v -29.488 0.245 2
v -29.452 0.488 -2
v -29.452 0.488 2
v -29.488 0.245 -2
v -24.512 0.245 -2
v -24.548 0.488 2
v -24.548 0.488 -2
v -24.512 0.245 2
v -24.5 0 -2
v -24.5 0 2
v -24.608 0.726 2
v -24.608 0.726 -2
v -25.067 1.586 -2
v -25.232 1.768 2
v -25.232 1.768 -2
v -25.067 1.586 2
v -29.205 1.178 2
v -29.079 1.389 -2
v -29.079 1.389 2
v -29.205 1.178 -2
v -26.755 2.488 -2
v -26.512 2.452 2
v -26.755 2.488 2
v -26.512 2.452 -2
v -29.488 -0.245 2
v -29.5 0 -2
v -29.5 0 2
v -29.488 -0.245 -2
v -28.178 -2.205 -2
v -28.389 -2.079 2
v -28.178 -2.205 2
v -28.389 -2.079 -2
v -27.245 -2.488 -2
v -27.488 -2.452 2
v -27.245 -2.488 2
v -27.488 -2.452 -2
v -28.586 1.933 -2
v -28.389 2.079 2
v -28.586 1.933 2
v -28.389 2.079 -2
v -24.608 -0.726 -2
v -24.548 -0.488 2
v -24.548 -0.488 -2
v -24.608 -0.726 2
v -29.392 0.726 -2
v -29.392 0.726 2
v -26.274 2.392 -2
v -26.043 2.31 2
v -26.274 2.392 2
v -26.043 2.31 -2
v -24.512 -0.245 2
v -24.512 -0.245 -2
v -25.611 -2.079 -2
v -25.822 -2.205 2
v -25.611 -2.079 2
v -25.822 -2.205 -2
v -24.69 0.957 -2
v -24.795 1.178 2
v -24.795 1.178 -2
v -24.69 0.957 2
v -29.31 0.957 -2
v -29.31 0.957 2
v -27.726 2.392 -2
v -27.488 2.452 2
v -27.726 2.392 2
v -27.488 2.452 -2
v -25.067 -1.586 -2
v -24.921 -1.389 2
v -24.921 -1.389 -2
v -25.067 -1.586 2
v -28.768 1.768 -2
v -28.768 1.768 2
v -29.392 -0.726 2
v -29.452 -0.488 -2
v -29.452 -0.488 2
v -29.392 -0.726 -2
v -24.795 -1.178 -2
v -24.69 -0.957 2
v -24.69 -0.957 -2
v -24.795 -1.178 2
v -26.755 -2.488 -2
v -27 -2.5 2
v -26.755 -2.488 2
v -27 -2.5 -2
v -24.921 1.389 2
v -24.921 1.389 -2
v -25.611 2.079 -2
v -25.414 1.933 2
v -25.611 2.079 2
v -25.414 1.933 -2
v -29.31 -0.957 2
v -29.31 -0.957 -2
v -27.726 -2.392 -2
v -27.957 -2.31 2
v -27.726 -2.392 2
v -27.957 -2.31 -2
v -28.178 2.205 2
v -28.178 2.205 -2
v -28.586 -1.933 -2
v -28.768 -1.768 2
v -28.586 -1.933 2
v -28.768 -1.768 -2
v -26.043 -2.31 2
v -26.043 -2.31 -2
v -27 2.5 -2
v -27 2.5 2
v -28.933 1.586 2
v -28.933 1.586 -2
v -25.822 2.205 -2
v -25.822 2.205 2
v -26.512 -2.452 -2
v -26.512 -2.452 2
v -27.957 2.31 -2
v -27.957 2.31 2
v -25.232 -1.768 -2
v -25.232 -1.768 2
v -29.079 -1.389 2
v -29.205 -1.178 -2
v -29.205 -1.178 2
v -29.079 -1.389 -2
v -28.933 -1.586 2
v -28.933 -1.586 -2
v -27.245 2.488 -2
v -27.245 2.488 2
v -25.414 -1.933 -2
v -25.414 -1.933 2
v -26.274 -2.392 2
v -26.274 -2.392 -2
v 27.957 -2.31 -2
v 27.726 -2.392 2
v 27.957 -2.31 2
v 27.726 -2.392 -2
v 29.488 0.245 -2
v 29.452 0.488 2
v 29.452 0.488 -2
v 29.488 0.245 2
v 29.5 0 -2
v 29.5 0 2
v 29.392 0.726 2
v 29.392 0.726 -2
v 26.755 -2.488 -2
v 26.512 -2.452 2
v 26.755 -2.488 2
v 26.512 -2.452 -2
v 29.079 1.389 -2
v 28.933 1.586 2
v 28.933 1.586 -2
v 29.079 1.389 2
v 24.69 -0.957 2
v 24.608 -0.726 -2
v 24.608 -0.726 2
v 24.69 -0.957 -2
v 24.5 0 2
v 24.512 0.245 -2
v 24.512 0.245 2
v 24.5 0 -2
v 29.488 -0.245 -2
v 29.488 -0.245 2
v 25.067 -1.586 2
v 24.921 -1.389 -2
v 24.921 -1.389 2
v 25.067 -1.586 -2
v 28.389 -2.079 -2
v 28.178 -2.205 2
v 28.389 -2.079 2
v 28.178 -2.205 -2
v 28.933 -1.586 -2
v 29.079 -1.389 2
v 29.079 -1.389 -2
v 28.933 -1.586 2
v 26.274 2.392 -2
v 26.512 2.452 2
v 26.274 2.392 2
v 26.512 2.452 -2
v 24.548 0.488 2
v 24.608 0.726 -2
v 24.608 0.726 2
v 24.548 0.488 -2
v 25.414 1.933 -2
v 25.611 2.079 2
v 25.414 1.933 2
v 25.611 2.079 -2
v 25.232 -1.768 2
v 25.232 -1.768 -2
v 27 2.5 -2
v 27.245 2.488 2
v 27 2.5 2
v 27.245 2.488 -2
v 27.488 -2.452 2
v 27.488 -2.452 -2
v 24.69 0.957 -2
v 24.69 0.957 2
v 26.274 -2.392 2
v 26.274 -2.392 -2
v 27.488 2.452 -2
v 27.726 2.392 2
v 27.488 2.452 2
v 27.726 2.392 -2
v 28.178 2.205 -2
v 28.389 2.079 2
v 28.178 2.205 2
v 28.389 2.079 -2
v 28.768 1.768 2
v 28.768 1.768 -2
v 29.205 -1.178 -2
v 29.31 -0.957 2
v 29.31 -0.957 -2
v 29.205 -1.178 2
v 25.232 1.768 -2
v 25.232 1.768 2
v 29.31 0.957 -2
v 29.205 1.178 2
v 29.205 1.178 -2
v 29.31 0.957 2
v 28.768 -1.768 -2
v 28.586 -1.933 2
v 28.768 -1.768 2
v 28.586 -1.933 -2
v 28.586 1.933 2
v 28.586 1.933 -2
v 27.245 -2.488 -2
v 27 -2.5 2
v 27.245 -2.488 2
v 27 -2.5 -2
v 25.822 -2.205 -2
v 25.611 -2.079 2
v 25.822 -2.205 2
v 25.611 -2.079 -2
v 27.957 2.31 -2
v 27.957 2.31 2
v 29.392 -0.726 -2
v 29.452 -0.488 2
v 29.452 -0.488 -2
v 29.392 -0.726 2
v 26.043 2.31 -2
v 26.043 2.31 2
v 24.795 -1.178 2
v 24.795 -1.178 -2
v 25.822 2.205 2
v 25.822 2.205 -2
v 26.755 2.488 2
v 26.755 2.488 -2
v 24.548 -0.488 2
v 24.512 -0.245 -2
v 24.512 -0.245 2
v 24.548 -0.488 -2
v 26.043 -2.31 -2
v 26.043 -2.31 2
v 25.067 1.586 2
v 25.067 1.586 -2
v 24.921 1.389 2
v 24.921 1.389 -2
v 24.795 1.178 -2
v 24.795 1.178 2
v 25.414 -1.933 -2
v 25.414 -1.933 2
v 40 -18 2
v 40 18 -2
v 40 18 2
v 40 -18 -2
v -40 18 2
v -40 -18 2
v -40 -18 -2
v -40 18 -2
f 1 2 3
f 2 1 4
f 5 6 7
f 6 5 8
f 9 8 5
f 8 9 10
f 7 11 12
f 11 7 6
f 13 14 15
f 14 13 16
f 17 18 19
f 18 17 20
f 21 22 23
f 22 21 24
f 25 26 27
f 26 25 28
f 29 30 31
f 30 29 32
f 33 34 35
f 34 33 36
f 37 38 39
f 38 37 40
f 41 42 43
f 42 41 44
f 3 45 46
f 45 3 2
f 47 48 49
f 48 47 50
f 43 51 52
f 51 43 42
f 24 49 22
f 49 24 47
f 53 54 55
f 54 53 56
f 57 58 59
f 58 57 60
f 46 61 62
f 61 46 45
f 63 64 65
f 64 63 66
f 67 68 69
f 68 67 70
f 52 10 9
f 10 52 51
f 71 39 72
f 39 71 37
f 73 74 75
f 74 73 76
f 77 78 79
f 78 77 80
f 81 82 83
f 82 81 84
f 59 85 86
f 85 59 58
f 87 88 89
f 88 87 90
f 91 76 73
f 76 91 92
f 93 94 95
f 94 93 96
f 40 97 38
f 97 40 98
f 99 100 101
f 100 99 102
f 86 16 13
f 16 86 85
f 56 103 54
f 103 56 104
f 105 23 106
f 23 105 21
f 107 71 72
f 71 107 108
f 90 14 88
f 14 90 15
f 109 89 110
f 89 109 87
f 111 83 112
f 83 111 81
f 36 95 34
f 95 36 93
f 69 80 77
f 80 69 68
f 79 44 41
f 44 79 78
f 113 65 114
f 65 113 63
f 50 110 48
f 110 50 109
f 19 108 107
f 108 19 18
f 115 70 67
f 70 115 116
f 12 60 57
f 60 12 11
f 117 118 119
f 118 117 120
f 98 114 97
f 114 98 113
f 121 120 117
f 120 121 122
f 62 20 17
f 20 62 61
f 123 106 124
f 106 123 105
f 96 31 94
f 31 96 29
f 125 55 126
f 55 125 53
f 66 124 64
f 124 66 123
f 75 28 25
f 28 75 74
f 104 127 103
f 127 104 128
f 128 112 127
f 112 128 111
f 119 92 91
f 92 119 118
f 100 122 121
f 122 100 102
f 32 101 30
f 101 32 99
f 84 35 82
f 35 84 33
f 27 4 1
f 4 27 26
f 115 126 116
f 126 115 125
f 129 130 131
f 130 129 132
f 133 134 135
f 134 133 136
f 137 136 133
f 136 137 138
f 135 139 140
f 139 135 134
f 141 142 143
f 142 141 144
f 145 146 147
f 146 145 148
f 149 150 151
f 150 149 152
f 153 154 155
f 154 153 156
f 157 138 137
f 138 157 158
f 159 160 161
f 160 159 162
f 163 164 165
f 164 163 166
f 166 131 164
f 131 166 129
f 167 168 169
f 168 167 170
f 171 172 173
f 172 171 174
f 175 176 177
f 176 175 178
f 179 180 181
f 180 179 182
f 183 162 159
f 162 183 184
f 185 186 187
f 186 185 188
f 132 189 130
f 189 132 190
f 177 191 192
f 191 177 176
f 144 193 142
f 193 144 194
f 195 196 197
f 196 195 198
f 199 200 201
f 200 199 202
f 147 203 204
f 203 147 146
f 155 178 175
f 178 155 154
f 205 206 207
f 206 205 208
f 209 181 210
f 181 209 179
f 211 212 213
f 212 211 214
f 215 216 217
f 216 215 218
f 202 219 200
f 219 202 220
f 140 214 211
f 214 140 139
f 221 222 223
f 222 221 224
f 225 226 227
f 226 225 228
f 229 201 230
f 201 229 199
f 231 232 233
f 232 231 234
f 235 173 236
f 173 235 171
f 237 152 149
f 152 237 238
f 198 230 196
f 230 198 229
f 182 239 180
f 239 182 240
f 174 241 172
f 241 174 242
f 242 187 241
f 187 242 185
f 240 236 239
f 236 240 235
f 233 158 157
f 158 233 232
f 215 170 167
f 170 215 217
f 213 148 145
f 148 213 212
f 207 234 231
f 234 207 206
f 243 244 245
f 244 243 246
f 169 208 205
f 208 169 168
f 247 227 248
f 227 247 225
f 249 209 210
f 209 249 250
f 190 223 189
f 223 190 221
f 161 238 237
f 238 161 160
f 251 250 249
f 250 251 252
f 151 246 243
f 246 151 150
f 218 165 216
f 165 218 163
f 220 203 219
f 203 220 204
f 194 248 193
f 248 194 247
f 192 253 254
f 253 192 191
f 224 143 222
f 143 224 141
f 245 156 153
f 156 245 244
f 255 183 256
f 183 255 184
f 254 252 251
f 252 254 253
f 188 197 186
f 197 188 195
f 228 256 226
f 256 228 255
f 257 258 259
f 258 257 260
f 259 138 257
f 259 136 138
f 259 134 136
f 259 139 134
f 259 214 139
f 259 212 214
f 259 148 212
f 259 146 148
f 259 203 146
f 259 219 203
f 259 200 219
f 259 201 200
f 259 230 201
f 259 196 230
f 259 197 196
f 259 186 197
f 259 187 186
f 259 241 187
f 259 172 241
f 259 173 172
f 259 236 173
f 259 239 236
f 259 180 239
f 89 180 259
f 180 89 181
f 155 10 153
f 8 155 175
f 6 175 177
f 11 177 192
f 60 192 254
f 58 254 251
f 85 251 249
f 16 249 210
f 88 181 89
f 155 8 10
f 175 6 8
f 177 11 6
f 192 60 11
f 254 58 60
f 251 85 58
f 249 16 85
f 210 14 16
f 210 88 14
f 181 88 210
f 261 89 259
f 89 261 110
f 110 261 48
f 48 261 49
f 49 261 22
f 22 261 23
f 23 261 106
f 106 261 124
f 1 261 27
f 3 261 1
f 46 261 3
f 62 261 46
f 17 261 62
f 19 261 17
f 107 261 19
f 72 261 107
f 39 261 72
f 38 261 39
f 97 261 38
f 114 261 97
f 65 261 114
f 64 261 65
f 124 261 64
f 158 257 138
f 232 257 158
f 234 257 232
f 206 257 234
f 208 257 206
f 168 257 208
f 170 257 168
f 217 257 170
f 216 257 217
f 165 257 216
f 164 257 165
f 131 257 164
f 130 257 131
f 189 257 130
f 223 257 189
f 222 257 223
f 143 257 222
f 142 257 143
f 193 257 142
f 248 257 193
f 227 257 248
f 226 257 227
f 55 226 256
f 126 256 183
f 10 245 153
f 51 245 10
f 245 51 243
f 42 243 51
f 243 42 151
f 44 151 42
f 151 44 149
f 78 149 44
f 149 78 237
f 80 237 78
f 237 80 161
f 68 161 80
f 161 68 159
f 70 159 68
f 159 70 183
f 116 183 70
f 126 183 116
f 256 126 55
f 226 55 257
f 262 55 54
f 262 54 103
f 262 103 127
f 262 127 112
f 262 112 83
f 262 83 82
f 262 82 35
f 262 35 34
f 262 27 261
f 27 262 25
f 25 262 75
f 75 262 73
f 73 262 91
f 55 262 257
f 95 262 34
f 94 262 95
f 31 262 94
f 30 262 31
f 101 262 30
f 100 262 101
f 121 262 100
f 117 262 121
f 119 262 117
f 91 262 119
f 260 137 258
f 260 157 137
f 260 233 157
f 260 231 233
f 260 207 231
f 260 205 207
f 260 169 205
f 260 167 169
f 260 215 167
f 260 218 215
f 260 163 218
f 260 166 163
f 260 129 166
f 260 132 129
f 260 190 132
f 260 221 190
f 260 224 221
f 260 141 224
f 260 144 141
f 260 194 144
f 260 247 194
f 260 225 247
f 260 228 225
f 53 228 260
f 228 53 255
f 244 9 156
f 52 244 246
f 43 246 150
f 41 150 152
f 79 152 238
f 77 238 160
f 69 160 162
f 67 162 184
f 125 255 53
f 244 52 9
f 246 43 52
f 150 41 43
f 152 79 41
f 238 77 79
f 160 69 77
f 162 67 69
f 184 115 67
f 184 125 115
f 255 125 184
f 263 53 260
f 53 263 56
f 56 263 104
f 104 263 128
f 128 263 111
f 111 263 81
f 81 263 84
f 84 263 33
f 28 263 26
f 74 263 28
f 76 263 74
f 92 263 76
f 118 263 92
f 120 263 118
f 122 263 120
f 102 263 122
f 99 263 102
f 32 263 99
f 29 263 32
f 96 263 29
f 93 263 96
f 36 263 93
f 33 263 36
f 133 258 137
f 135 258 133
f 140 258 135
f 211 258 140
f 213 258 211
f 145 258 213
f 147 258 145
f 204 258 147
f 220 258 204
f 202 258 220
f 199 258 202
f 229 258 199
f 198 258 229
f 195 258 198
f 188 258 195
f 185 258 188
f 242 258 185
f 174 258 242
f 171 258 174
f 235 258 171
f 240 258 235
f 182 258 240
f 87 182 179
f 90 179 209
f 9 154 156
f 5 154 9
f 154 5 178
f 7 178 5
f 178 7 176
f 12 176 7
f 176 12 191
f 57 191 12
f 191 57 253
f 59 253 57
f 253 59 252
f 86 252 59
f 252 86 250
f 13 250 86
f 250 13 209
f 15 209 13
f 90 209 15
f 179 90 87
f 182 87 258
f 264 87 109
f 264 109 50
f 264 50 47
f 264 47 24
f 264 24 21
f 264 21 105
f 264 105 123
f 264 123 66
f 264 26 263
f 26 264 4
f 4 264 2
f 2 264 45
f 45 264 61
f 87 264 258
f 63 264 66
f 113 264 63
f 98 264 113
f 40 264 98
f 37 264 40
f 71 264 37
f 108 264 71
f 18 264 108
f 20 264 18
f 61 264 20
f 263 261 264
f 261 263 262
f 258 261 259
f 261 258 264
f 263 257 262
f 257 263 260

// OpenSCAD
// Basic parametric mounting plate.
// Units are millimeters.

$fn = 64;

plate_length = 80;
plate_width = 36;
plate_thickness = 4;

hole_diameter = 5;
hole_spacing = 54;

module mounting_plate() {
    difference() {
        cube([plate_length, plate_width, plate_thickness], center = true);

        for (x = [-hole_spacing / 2, hole_spacing / 2]) {
            translate([x, 0, 0])
                cylinder(
                    h = plate_thickness + 1,
                    d = hole_diameter,
                    center = true
                );
        }
    }
}

mounting_plate();
